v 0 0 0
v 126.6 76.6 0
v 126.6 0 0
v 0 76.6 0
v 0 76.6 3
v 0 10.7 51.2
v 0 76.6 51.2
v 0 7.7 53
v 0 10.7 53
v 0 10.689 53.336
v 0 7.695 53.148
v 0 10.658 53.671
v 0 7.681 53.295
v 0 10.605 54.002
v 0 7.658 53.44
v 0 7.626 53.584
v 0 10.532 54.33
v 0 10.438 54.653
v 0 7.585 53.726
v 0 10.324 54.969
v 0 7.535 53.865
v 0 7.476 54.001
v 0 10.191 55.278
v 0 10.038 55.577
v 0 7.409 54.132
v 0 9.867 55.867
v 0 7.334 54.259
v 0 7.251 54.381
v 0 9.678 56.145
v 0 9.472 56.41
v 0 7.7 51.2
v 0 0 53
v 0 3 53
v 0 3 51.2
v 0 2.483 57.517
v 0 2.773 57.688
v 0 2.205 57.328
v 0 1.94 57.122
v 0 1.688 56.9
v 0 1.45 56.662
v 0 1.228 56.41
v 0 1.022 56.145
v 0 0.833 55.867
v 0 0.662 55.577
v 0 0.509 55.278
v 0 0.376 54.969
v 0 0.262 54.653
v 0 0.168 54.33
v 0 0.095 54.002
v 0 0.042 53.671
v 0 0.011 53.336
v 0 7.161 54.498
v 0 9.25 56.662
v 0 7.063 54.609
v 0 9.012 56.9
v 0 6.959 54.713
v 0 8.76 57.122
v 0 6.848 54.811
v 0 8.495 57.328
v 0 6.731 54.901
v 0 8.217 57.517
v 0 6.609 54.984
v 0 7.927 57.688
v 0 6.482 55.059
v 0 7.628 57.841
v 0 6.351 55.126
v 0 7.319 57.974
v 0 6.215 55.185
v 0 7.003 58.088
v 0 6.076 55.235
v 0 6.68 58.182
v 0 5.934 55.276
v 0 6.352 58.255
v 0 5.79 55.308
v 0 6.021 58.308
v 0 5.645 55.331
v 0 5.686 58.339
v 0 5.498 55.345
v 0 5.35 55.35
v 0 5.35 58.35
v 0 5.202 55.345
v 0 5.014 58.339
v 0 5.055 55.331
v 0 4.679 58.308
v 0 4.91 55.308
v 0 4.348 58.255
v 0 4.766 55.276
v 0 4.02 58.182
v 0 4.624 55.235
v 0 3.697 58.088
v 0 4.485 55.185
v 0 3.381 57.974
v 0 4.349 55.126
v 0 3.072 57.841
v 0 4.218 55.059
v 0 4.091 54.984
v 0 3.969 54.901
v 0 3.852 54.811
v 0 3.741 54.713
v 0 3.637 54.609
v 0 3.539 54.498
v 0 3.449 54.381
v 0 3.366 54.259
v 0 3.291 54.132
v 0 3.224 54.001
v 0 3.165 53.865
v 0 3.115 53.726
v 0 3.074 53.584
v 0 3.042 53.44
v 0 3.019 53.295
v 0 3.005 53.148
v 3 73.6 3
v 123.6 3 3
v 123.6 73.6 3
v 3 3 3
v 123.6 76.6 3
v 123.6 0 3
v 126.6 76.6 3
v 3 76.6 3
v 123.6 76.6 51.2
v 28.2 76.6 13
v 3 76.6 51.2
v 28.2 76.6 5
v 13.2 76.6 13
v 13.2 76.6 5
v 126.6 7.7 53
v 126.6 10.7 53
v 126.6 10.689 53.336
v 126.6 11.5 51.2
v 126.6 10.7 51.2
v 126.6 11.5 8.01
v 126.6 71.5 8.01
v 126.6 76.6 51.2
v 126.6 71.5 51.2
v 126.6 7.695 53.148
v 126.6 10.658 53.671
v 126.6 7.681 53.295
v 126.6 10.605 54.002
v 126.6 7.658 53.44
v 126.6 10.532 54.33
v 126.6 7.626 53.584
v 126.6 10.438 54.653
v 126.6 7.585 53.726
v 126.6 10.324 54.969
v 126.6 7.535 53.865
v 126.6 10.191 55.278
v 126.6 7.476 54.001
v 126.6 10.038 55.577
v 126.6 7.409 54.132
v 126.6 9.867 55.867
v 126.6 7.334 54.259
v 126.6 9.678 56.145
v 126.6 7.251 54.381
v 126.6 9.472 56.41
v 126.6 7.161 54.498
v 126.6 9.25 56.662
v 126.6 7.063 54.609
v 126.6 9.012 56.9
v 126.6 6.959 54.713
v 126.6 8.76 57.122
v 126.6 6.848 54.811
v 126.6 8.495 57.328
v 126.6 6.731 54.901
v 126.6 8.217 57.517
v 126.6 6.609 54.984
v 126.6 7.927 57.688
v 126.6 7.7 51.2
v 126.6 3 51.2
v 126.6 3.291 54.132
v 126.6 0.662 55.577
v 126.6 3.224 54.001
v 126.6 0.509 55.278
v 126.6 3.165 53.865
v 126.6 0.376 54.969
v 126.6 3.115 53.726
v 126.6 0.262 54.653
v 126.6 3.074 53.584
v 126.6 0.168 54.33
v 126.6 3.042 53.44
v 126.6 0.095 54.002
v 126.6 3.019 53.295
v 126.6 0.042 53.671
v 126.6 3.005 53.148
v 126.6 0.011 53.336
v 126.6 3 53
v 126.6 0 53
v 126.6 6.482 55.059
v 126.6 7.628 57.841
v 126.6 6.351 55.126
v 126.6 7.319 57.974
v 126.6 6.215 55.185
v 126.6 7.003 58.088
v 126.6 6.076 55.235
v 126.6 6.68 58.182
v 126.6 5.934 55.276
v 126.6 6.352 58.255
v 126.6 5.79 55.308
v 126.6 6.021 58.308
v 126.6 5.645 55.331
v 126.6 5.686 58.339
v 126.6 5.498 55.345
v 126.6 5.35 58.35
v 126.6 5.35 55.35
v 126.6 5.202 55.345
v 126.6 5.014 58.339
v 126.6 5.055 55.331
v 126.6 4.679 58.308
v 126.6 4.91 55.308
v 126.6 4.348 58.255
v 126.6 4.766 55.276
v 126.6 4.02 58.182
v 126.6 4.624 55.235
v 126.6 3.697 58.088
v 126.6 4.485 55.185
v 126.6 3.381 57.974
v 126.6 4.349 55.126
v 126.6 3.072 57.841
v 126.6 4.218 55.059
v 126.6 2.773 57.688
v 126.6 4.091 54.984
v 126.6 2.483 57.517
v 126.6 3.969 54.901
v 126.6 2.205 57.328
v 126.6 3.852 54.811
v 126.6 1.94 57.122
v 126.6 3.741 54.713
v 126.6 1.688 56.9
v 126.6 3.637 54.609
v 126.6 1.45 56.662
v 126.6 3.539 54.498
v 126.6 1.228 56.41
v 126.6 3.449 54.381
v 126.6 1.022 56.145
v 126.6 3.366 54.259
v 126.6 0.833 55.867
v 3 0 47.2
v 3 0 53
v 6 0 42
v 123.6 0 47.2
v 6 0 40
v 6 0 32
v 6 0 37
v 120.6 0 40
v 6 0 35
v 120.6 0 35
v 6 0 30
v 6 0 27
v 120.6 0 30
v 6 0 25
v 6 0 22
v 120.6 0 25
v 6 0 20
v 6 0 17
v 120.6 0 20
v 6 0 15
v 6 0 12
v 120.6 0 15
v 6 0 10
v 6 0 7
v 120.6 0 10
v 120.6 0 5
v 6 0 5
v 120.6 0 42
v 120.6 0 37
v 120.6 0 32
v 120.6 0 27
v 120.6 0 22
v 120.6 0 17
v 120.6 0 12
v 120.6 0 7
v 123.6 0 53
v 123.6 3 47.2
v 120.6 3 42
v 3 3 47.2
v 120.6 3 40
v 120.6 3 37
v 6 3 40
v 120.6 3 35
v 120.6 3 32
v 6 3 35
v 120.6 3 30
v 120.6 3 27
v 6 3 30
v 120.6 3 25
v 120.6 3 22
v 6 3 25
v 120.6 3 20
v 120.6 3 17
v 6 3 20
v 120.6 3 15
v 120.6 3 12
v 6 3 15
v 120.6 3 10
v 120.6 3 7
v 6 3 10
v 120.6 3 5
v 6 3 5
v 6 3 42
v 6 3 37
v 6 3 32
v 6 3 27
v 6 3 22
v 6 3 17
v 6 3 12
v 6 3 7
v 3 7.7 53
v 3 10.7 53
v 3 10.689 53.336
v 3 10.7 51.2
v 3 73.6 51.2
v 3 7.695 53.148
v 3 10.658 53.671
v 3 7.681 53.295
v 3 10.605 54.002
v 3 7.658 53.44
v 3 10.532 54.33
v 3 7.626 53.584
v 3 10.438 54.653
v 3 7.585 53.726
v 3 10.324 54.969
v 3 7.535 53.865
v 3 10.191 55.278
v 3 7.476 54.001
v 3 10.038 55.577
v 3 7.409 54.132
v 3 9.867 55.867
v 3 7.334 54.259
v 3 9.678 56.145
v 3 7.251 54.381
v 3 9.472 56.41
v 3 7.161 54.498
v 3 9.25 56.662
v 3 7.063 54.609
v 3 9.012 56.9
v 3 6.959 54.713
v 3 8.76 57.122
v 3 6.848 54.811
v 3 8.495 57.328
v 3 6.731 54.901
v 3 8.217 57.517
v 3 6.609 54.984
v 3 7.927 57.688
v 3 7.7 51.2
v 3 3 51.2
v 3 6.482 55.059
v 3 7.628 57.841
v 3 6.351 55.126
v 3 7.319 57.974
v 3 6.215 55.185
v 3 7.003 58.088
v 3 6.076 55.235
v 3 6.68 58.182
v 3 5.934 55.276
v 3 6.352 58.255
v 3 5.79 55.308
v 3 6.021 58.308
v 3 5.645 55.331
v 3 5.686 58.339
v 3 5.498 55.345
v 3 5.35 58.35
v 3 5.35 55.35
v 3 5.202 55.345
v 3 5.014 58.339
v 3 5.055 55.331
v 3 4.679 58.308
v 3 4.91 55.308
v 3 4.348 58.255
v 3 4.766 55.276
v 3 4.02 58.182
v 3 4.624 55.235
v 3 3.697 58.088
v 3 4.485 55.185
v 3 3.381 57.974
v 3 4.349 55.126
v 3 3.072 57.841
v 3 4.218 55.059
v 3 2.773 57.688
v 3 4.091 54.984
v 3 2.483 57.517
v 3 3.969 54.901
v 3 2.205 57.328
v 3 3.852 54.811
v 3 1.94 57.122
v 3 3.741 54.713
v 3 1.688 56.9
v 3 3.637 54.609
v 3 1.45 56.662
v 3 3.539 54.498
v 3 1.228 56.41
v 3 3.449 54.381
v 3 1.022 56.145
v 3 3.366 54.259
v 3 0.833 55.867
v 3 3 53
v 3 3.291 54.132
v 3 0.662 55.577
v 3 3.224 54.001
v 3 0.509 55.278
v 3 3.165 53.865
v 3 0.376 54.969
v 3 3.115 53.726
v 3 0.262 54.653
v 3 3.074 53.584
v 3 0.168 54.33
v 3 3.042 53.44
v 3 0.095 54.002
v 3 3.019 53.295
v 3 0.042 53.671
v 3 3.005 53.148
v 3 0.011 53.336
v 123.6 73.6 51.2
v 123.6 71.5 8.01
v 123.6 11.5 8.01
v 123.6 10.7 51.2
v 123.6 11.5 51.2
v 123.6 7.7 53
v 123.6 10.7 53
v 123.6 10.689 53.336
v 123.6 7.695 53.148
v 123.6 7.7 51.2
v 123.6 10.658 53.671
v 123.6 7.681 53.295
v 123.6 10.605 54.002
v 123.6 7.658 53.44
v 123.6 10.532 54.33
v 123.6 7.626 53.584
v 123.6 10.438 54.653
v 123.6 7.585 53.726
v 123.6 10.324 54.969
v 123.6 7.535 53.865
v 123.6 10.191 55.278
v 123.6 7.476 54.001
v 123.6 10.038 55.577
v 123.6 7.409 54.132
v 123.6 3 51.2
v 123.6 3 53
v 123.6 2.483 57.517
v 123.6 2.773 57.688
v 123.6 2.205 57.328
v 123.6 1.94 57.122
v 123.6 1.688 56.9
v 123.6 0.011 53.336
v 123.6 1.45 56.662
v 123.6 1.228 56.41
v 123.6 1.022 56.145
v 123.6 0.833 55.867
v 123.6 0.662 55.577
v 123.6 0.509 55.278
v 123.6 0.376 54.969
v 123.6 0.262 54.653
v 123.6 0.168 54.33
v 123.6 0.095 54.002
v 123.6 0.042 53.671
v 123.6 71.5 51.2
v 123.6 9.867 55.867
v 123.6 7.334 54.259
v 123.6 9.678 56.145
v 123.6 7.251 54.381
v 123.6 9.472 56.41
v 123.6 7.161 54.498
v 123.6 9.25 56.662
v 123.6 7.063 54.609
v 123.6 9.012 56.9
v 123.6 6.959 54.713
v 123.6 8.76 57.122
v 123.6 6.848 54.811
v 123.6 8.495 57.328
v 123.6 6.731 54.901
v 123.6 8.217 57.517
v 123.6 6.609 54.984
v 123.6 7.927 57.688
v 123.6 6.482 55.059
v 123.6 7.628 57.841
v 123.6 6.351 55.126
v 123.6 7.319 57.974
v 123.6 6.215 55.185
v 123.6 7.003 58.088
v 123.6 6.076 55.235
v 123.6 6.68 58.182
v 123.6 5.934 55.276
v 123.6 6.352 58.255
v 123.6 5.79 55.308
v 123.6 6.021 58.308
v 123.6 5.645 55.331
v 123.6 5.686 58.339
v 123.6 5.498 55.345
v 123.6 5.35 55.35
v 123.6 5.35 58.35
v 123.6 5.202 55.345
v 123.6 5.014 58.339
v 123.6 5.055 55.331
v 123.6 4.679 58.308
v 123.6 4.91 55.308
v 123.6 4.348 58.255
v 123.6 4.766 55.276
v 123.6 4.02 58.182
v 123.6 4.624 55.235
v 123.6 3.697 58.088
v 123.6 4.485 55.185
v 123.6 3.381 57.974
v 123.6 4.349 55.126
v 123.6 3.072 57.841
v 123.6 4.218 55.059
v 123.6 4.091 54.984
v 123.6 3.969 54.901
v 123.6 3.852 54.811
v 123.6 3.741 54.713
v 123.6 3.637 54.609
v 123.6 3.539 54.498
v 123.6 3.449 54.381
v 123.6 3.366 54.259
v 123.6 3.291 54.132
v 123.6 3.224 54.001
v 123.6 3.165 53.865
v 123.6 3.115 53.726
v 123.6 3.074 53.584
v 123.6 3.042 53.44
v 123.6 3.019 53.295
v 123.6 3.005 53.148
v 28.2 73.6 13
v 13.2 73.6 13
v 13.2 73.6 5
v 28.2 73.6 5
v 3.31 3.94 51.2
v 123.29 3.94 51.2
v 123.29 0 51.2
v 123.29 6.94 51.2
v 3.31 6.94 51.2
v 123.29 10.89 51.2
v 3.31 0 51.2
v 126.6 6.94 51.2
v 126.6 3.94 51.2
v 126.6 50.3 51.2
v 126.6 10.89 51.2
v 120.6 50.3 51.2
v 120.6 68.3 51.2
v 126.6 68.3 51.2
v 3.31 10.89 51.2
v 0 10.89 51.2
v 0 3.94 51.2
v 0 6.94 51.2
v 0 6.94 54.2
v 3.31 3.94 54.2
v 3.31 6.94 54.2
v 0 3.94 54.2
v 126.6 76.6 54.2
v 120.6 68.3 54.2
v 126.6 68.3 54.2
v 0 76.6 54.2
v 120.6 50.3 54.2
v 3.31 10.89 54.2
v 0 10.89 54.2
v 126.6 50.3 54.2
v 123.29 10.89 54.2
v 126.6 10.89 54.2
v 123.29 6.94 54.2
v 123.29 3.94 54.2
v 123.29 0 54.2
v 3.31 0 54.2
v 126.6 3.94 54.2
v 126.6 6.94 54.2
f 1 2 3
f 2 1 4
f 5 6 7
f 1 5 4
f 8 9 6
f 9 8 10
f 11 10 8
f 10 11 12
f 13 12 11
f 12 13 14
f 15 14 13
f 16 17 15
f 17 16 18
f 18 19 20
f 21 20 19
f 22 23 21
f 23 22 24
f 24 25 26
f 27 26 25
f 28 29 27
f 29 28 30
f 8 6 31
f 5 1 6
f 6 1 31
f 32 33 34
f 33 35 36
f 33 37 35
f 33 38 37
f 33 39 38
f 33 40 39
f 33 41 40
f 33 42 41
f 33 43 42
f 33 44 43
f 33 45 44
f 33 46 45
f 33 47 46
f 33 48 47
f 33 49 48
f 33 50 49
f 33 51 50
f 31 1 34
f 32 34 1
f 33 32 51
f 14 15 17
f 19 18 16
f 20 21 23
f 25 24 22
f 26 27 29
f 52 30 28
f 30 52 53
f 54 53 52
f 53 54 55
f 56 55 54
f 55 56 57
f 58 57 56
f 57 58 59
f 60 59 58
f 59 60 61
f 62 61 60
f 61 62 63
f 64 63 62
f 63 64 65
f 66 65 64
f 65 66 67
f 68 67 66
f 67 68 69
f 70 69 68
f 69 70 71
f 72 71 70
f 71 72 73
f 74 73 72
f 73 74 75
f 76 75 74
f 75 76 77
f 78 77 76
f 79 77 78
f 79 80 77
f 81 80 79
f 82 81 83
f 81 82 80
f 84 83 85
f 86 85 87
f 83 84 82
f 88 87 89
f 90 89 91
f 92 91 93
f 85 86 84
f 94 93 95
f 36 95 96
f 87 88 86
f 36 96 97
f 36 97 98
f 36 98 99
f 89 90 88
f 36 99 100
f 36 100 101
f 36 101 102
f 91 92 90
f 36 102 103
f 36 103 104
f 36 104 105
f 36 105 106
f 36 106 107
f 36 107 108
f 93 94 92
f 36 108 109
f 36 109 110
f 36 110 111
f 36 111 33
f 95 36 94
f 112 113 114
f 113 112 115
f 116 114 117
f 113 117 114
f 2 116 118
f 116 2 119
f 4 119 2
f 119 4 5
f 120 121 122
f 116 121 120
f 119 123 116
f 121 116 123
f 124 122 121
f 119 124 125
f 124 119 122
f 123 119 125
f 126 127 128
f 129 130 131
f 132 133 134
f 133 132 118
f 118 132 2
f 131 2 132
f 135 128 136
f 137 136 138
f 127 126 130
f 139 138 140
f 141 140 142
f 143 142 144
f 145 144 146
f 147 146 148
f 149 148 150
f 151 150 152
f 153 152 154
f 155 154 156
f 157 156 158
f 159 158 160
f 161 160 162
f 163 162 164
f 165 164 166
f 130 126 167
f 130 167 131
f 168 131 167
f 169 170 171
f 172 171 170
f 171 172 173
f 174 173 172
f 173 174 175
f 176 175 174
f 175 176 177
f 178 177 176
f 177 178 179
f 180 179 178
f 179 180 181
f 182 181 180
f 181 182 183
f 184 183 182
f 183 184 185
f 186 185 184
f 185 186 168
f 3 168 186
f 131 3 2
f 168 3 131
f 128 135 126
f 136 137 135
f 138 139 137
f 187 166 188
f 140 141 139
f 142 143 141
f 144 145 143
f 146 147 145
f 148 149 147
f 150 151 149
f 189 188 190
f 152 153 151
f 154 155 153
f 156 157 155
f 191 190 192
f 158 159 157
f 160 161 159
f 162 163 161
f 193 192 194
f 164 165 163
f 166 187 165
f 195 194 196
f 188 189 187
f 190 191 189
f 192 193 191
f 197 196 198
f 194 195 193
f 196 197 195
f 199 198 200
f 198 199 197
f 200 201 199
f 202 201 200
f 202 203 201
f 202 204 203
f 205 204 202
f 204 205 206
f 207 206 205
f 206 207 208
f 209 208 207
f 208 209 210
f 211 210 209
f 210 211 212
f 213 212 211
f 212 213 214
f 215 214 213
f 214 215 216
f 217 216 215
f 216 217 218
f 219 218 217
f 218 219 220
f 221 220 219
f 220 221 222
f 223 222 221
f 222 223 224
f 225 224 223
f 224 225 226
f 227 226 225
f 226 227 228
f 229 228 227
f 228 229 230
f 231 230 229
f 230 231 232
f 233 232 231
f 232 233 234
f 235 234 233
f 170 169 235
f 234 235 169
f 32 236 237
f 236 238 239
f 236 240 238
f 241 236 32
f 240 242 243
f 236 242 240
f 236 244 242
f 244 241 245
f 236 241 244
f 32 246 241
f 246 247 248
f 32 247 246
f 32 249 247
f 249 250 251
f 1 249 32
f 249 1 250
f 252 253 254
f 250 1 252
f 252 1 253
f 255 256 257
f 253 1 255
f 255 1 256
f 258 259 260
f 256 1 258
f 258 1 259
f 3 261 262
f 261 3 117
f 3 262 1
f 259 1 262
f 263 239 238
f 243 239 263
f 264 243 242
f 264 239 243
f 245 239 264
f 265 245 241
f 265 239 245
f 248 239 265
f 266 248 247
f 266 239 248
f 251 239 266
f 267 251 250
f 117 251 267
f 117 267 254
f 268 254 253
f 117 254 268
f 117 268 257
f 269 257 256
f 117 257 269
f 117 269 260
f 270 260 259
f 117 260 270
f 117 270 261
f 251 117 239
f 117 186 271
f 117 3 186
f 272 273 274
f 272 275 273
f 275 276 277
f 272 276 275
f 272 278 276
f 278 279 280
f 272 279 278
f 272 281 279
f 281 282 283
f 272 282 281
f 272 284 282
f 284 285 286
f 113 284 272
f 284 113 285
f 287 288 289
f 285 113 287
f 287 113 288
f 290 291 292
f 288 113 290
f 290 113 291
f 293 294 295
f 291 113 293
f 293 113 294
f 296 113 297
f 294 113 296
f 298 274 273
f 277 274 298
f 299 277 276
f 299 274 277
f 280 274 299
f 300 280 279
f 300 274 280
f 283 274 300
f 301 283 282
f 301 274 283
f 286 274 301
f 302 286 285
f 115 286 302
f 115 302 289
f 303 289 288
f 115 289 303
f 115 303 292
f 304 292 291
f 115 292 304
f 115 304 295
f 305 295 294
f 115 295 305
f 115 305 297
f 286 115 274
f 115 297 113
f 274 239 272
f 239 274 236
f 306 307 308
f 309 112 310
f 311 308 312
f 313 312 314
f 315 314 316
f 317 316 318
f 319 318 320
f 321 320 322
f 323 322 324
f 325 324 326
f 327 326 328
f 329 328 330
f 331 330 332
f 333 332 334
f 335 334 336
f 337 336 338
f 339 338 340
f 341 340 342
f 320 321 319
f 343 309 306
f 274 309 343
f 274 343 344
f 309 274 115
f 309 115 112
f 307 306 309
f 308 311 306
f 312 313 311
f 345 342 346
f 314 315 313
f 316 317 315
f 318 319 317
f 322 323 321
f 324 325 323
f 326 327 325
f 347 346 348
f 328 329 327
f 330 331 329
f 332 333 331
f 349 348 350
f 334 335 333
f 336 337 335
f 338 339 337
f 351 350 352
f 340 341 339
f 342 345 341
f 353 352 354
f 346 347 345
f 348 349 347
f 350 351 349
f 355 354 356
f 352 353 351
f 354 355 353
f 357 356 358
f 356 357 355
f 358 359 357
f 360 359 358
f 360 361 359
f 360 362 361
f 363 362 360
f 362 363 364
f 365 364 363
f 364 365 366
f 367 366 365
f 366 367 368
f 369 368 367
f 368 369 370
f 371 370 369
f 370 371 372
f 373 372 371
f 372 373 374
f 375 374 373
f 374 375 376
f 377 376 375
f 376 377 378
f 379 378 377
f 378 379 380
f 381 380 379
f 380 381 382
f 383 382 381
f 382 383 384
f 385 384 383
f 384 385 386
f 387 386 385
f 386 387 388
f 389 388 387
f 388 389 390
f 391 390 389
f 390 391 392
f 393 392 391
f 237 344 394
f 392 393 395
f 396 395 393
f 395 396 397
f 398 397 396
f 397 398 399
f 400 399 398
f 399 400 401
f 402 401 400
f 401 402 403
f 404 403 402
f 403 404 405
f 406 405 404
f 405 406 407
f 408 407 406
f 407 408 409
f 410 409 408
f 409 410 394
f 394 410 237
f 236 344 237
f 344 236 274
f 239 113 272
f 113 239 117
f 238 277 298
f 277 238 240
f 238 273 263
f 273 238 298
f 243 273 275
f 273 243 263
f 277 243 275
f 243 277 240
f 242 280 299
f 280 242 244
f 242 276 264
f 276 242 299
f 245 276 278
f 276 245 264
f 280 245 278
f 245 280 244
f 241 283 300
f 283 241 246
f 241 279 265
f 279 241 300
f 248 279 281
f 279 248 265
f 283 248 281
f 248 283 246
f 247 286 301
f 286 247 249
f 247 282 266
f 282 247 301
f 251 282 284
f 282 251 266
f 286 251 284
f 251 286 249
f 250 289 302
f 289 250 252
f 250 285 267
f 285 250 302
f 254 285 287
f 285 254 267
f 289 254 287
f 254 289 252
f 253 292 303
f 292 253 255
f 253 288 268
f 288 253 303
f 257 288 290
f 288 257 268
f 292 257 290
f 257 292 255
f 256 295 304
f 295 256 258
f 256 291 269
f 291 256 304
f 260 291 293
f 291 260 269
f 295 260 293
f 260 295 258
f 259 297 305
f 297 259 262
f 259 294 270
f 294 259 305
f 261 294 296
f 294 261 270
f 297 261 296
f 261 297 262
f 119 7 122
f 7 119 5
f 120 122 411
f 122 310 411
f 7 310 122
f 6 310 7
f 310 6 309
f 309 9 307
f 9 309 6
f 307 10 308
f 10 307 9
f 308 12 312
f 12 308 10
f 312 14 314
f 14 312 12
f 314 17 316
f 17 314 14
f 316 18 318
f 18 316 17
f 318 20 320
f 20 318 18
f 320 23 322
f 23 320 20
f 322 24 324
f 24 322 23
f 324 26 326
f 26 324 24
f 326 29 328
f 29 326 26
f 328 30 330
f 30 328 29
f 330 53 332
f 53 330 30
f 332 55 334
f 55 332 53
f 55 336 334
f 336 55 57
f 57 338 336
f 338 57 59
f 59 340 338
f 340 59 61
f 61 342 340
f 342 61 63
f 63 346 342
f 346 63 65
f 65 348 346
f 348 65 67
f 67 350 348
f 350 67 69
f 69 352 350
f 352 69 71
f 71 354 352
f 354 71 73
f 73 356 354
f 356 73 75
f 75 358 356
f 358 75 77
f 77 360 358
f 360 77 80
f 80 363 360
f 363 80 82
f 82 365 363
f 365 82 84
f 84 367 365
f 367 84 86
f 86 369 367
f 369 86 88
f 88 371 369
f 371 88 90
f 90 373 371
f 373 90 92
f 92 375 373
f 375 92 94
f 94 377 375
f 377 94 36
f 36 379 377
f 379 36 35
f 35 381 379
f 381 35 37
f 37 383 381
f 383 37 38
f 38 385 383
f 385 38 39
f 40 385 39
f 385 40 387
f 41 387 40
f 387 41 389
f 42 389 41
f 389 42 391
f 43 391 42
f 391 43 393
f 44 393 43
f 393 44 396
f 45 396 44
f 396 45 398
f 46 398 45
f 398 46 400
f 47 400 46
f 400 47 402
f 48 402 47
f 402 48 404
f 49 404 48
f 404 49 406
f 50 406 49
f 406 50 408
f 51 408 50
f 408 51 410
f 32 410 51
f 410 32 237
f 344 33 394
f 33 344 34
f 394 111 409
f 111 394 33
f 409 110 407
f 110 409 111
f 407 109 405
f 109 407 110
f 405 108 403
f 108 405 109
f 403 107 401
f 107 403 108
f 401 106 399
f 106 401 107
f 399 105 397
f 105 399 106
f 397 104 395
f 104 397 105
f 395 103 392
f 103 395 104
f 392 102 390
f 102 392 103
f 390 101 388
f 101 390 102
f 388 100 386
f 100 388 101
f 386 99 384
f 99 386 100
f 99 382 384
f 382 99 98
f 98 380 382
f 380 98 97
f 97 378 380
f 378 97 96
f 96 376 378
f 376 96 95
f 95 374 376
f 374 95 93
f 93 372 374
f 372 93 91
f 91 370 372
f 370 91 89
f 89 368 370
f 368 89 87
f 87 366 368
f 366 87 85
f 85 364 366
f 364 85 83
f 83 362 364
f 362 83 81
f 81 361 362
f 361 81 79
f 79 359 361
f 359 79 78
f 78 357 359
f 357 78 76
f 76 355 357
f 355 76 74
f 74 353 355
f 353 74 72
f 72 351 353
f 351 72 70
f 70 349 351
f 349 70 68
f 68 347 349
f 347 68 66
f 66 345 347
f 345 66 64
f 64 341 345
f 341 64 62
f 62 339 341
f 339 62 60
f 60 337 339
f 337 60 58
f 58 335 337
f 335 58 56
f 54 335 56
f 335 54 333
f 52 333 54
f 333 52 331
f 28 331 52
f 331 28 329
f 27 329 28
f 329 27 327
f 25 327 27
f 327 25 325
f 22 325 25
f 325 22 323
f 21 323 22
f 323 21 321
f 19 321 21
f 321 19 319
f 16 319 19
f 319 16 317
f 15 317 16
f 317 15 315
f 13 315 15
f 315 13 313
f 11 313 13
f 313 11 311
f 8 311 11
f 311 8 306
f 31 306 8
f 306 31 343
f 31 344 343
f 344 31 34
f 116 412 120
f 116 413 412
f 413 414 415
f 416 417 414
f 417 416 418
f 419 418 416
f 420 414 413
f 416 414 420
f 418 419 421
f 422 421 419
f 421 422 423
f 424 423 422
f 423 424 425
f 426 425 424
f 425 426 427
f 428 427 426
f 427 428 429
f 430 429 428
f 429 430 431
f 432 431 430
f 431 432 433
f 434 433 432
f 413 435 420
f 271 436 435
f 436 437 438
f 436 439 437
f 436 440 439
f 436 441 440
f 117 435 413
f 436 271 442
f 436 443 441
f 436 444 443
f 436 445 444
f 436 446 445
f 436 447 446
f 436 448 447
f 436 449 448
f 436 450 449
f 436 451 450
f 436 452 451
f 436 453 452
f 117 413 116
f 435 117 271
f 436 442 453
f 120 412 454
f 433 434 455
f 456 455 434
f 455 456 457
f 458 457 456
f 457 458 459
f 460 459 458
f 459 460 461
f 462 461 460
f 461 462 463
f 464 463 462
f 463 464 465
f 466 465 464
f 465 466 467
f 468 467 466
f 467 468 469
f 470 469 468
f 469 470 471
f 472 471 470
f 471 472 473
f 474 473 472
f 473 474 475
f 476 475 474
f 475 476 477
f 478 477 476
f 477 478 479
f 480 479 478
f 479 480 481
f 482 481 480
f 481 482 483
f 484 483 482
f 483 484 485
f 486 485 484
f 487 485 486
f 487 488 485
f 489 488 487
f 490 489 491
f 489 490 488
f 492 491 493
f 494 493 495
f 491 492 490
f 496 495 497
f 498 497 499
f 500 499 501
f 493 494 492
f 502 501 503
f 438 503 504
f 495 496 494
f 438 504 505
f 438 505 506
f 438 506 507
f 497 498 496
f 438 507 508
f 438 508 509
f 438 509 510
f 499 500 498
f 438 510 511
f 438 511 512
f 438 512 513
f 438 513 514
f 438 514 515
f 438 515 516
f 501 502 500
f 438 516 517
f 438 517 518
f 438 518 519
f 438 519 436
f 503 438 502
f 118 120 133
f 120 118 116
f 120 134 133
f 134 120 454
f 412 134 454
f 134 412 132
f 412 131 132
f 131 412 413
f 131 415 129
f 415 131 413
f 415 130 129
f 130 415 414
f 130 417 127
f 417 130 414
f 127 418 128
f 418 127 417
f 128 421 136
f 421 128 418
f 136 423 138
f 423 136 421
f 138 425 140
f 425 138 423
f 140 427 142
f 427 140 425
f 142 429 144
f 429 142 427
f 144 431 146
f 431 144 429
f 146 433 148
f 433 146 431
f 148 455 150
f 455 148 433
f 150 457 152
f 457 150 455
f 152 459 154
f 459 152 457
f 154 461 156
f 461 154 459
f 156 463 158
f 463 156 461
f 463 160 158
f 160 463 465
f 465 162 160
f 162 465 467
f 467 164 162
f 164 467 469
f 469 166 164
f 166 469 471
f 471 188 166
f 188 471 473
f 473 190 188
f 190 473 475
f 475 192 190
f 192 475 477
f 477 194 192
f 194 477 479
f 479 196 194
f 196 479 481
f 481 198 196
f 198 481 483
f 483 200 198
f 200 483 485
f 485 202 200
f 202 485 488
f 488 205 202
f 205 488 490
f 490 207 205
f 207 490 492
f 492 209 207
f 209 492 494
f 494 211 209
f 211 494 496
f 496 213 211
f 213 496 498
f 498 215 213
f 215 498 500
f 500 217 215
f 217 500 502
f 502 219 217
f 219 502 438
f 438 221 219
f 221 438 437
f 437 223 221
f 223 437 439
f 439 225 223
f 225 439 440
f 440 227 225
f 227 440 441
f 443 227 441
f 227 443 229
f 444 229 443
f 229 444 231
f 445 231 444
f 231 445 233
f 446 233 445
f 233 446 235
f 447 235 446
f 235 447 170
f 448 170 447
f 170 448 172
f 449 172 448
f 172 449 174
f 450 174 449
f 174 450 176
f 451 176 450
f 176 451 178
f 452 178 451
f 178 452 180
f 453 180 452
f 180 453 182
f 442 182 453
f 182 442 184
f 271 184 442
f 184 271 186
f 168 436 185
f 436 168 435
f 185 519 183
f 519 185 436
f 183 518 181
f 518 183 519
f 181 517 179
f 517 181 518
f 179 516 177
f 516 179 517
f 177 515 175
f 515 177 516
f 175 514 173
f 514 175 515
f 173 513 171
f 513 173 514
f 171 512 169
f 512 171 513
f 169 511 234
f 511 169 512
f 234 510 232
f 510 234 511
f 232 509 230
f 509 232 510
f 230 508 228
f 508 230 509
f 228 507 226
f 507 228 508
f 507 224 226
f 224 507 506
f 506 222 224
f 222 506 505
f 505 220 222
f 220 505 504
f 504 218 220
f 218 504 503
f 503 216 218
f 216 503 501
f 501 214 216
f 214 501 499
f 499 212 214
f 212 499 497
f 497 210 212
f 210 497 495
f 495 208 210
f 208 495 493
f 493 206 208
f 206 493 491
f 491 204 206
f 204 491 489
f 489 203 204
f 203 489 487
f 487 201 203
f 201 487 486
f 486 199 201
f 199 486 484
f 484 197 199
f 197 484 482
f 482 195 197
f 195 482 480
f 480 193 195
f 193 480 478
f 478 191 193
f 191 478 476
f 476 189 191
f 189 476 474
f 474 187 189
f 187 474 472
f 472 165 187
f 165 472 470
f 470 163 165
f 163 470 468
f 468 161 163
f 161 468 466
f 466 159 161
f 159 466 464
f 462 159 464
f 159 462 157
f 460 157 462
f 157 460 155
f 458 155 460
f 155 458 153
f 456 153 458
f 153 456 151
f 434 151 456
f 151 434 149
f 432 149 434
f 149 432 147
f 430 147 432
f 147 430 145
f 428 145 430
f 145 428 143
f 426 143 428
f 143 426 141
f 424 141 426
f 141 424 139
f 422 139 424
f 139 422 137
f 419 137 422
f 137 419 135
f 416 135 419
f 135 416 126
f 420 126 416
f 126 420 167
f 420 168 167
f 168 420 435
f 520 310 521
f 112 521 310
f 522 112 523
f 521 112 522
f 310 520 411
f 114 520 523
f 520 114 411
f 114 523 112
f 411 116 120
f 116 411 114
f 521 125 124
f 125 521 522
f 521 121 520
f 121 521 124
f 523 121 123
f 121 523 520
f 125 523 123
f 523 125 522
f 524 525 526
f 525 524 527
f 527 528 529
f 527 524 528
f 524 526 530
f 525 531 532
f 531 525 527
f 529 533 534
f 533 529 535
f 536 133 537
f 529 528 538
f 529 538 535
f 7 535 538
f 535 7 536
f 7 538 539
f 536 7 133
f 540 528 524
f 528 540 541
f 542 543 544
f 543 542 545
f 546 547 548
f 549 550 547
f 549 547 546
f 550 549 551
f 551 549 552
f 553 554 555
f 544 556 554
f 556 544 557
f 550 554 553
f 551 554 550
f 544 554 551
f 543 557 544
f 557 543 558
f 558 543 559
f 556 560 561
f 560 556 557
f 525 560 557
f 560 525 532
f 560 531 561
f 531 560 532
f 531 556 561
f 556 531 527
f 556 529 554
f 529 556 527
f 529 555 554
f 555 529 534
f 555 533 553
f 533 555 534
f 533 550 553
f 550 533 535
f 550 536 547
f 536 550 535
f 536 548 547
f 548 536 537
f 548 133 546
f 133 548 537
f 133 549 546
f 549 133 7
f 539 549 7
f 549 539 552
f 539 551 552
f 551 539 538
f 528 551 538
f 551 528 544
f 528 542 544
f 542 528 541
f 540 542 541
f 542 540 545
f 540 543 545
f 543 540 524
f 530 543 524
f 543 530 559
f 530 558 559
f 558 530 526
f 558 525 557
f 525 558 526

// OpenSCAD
// file: box.scad
// The laser cutter kerf.
kerf = 0.2 / 2;

// The thickness of the wood plank.
thickness = 3;

length = 120;
width = 70;
height = 48;

margin = 0.2;

// Size of the openning in the box.
openning = 2;

$fn = 100;

// Smallest width of wood that we want anywhere (used between openning and also for the closing mechanism).
safety = 3;

hook_inside = 4.5;  // > sqrt(2*safety^2)

epsilon = 0.01;

module bottom() {
  square([length + 2 * margin + 2 * kerf + 2 * thickness, width + 2 * margin + 2 * kerf + 2 * thickness]);
}

module front() {
  difference() {
    // The -4 on the height is to have some margin for the movement of the top piece.
    square([length + 2 * margin + 2 * kerf, height + 2 * kerf - 4]);
    
    for(s = [2 : safety + openning : height - safety - openning - 2])
      translate([safety, s])
        square([length + 2 * margin + 2 * kerf - 2 * safety, openning]);
  }
}

module side_hook() {
  translate([0, 2])
  difference() {
    circle(d = 2 * safety + hook_inside + 2 * kerf);
    circle(d = hook_inside + 2 * kerf);
    translate([0, -50])
      square([2 * safety + hook_inside + 2 * kerf + 2 * epsilon, 100], center = true);
  }
  translate([- safety - hook_inside / 2 - kerf, 0])
    square([safety, 2]);
  translate([hook_inside / 2 + kerf, 0])
    square([safety, 2]);
}

module left() {
  square([width + 2 * margin + 2 * kerf + 2 * thickness, height + 2 * kerf]);
  translate([safety + hook_inside / 2 + kerf, height])
    side_hook();
}

module right() {
  difference() {
    square([width + 2 * margin + 2 * kerf + 2 * thickness, height + 2 * kerf]);
    translate([8.5 + thickness, 5 + epsilon])
      square([60, height + 2 * kerf + epsilon - 5]);
  }
  translate([safety + hook_inside / 2 + kerf, height])  
    side_hook();
}

module back() {
  difference() {
    square([length + 2 * margin + 2 * kerf, height + 2 * kerf]);
    translate([10 + margin, 2])
      square([15, 8]);
  }
}

module top_hook() {
  translate([-epsilon, -epsilon])
  difference() {
    square([thickness + margin + kerf + 2 * epsilon, 2 * safety + 2 * margin + hook_inside]);
    translate([- 2 * epsilon, safety + margin + (hook_inside - safety) / 2])
      square([thickness + margin + kerf + 4 * epsilon, safety]);
  }
}

module top() {
  difference() {
    square([length + 2 * margin + 2 * kerf + 2 * thickness, width + 2 * margin + 2 * kerf + 2 * thickness]);
    top_hook();
    translate([length + margin + kerf +  thickness, 0])
      top_hook();
    translate([length + 2 * margin + 2 * kerf + thickness - 3, width + margin + kerf + thickness - 18 - 5])
      square([thickness + 3 + epsilon, 18]);
  }
}
// main file
include <box.scad>

linear_extrude(3) bottom();

translate([thickness, thickness, thickness])
  rotate([90, 0, 0])
    linear_extrude(thickness) front();

translate([0, 0, thickness]) 
  rotate([0, 90, 0])
    rotate([0, 0, 90])
      linear_extrude(thickness) left();

translate([length + 2 * margin + 2 * kerf + thickness, 0, thickness]) 
  rotate([0, 90, 0])
    rotate([0, 0, 90])
      linear_extrude(thickness) right();

translate([thickness, 2 * thickness + width + 2 * margin + 2 * kerf, thickness])
  rotate([90, 0, 0])
    linear_extrude(thickness) back();

translate([0, 0, height + 2 * kerf + thickness])
  linear_extrude(3) top();
